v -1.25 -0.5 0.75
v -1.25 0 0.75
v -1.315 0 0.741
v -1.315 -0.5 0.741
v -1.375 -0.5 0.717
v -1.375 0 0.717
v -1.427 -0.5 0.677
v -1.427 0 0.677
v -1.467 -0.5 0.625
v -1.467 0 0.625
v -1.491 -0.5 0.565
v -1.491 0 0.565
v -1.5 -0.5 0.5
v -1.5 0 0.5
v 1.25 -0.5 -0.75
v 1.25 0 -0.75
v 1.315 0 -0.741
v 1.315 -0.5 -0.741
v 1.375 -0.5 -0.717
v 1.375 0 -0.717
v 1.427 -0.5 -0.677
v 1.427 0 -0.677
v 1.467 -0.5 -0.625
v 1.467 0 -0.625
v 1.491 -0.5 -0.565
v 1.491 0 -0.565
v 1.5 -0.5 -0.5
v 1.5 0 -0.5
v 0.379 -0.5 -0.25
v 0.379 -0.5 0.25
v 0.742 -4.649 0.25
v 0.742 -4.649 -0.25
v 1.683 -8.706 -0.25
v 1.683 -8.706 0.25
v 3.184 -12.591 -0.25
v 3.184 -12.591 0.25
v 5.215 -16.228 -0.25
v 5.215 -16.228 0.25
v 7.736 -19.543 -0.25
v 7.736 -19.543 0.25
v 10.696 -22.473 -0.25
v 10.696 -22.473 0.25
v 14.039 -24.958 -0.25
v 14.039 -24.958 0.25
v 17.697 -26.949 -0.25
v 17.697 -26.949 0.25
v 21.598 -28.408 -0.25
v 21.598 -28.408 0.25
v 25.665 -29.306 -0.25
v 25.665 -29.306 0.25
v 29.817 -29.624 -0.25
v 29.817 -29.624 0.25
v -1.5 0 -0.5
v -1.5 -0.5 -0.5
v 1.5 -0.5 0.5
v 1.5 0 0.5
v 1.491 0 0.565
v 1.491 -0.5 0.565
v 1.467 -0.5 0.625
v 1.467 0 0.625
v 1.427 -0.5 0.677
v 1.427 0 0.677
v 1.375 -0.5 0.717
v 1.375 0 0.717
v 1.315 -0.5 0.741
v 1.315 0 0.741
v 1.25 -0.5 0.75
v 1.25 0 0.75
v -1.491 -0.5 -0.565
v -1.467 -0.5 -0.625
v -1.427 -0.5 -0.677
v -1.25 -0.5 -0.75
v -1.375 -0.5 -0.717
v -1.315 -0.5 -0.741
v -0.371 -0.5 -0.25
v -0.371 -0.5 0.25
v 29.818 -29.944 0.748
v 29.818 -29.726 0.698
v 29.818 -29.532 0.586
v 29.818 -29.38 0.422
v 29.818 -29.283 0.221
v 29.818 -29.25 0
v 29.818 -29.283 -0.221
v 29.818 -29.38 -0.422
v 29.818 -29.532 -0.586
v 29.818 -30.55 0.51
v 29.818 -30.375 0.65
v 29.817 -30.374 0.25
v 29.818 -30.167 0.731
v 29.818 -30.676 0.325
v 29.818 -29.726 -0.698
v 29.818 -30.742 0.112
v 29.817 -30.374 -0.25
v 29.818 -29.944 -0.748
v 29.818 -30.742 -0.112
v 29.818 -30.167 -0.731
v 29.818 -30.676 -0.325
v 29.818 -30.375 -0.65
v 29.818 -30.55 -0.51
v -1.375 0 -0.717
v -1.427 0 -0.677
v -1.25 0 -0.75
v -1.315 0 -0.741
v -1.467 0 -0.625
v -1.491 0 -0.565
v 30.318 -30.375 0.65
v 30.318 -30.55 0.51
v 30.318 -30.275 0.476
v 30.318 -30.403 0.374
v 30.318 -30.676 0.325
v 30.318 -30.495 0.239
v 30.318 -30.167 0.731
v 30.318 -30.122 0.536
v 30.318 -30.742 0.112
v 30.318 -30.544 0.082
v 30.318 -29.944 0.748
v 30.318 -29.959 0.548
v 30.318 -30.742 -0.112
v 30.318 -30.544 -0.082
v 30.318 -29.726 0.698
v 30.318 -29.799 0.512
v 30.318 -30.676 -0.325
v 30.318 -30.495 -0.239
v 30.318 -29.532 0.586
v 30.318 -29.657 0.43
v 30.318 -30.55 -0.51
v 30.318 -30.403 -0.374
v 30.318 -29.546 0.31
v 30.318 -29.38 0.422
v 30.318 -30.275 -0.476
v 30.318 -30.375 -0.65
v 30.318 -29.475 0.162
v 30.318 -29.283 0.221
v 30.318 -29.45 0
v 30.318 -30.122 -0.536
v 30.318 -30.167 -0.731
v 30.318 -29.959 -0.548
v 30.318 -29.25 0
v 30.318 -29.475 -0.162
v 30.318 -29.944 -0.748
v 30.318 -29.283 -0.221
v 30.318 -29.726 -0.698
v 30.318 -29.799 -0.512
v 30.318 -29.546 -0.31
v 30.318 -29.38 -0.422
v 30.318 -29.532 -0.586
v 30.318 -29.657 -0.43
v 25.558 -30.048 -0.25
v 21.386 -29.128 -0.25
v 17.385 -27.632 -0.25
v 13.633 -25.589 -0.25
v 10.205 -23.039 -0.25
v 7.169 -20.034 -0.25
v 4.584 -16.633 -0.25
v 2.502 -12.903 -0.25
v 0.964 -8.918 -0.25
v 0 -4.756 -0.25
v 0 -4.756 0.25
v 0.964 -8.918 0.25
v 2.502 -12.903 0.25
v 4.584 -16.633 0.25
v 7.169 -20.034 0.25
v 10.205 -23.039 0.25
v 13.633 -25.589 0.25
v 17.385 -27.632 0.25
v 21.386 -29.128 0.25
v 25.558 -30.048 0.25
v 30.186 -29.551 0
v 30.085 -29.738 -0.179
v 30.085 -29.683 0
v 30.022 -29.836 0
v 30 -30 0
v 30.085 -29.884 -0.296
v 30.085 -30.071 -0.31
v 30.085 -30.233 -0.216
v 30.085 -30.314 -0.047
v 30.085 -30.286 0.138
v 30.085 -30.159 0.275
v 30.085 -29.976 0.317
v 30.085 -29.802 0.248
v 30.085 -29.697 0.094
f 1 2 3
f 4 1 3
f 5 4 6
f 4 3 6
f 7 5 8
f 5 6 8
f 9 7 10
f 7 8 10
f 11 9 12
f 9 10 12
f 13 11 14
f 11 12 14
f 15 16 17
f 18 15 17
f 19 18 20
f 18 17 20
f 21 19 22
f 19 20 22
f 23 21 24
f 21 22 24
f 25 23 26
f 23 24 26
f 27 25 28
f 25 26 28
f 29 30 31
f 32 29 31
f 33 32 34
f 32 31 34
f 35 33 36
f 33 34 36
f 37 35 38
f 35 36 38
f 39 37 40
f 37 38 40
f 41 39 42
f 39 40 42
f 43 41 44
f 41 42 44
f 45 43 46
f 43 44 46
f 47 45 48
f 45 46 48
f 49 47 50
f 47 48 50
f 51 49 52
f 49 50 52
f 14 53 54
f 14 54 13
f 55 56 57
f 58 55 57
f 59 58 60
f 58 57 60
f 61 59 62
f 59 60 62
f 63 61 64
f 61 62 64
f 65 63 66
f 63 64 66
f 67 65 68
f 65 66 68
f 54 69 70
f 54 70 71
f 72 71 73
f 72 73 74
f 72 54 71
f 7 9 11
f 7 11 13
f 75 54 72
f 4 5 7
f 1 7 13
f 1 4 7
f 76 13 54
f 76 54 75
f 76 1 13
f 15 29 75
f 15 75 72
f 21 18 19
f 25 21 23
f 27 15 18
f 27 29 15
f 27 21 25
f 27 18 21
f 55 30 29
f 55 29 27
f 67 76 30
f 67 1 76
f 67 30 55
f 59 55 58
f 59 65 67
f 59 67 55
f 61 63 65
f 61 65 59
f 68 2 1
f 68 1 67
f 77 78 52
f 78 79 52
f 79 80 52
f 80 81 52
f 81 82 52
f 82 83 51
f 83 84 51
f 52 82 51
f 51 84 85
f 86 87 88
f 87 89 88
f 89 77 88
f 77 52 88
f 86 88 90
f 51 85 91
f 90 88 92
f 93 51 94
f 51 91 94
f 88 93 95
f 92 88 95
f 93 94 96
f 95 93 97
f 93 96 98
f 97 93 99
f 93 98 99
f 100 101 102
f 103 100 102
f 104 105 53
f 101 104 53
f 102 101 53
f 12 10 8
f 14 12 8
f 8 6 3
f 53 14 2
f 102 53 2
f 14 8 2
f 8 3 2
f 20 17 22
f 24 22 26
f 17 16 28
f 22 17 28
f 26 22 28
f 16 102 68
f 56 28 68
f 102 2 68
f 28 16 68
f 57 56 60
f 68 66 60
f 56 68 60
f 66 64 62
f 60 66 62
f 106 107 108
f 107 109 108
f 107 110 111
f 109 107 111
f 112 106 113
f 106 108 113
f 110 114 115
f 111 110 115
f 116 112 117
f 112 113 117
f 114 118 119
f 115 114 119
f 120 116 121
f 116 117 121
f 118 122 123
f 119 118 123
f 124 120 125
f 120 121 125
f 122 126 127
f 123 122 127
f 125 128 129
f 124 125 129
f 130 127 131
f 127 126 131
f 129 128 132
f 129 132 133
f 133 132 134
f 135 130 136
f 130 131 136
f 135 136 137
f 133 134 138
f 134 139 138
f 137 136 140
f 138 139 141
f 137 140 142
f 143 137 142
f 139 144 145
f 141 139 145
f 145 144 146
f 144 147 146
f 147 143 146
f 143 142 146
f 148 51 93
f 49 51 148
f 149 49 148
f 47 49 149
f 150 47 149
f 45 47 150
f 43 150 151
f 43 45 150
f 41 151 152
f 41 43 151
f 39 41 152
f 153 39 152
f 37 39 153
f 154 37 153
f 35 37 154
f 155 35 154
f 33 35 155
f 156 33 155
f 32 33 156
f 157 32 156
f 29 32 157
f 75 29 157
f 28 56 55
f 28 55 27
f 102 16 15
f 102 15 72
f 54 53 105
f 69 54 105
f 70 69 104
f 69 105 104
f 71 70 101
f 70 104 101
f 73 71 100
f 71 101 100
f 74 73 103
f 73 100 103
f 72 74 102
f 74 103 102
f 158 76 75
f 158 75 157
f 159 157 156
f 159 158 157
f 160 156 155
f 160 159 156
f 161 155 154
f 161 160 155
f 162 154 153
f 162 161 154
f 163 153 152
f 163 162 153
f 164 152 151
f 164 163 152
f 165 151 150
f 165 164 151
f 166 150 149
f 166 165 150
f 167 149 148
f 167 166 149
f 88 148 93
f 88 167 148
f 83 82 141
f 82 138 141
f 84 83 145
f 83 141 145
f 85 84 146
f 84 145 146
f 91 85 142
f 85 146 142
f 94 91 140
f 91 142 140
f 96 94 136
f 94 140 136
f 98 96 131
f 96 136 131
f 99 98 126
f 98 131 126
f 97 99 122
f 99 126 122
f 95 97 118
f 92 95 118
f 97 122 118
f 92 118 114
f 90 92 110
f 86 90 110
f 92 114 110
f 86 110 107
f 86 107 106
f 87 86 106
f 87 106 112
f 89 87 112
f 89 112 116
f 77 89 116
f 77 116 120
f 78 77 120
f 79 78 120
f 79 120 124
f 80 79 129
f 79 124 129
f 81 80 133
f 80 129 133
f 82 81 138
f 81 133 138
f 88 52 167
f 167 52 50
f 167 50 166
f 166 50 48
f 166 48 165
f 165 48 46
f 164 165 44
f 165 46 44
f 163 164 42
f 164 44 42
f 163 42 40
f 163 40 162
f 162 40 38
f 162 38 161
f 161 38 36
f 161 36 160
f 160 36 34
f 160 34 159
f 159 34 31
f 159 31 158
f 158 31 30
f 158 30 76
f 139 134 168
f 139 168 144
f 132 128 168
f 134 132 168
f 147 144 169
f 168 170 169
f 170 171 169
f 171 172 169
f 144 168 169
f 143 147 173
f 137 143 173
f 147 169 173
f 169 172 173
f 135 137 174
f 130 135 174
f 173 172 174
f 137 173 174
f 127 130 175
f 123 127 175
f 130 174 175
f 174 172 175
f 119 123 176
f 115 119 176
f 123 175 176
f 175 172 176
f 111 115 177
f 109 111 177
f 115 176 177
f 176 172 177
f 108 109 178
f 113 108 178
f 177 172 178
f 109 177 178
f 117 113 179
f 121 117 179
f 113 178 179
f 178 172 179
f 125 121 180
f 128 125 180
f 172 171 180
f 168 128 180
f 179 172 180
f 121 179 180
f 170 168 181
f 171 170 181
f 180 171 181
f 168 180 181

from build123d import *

# Parameters (mm, degrees)
PAD_DEPTH    = 0.25
PAD001_DEPTH = 0.5


with BuildPart() as part:
    # Sketch → Pad (new body, symmetric)
    with BuildSketch(Plane.XY):
        with BuildLine():
            Line((-0.375, 0), (0, 0))
            Line((0, 0), (0.375, 0))
            ThreePointArc((0.375, 0), (9.051962, -20.948038), (30, -29.625))
            Line((30, -29.625), (30, -30.375))
            ThreePointArc((-0.375, 0), (8.521632, -21.478368), (30, -30.375))
        make_face()
    extrude(amount=PAD_DEPTH, both=True)

    # Sketch002 → Pad001 (join)
    with BuildSketch(Plane.XZ):
        with BuildLine():
            ThreePointArc((-1.25, 0.75), (-1.426777, 0.676777), (-1.5, 0.5))
            Line((-1.5, -0.5), (-1.5, 0.5))
            ThreePointArc((-1.5, -0.5), (-1.426777, -0.676777), (-1.25, -0.75))
            Line((1.25, -0.75), (-1.25, -0.75))
            ThreePointArc((1.25, -0.75), (1.426777, -0.676777), (1.5, -0.5))
            Line((1.5, 0.5), (1.5, -0.5))
            ThreePointArc((1.5, 0.5), (1.426777, 0.676777), (1.25, 0.75))
            Line((-1.25, 0.75), (1.25, 0.75))
        make_face()
    extrude(amount=PAD001_DEPTH)

    # Sketch003 (on DatumPlane) → Revolution (revolve)
    with BuildSketch(Plane(origin=(30, -30, 0), x_dir=(1, 0, 0), z_dir=(0, 0, 1))):
        with BuildLine():
            Line((0, 0), (-0.1825, 0))
            Line((-0.1825, 0), (-0.1825, 0.75))
            Line((-0.1825, 0.75), (0.3175, 0.75))
            Line((0.3175, 0.75), (0.3175, 0.549926))
            ThreePointArc((0.3175, 0.549926), (0.085074, 0.3175), (0, 0))
        make_face()
    revolve(axis=Axis((30, -30, 0), (-1, 0, 0)))


solid = part.part
